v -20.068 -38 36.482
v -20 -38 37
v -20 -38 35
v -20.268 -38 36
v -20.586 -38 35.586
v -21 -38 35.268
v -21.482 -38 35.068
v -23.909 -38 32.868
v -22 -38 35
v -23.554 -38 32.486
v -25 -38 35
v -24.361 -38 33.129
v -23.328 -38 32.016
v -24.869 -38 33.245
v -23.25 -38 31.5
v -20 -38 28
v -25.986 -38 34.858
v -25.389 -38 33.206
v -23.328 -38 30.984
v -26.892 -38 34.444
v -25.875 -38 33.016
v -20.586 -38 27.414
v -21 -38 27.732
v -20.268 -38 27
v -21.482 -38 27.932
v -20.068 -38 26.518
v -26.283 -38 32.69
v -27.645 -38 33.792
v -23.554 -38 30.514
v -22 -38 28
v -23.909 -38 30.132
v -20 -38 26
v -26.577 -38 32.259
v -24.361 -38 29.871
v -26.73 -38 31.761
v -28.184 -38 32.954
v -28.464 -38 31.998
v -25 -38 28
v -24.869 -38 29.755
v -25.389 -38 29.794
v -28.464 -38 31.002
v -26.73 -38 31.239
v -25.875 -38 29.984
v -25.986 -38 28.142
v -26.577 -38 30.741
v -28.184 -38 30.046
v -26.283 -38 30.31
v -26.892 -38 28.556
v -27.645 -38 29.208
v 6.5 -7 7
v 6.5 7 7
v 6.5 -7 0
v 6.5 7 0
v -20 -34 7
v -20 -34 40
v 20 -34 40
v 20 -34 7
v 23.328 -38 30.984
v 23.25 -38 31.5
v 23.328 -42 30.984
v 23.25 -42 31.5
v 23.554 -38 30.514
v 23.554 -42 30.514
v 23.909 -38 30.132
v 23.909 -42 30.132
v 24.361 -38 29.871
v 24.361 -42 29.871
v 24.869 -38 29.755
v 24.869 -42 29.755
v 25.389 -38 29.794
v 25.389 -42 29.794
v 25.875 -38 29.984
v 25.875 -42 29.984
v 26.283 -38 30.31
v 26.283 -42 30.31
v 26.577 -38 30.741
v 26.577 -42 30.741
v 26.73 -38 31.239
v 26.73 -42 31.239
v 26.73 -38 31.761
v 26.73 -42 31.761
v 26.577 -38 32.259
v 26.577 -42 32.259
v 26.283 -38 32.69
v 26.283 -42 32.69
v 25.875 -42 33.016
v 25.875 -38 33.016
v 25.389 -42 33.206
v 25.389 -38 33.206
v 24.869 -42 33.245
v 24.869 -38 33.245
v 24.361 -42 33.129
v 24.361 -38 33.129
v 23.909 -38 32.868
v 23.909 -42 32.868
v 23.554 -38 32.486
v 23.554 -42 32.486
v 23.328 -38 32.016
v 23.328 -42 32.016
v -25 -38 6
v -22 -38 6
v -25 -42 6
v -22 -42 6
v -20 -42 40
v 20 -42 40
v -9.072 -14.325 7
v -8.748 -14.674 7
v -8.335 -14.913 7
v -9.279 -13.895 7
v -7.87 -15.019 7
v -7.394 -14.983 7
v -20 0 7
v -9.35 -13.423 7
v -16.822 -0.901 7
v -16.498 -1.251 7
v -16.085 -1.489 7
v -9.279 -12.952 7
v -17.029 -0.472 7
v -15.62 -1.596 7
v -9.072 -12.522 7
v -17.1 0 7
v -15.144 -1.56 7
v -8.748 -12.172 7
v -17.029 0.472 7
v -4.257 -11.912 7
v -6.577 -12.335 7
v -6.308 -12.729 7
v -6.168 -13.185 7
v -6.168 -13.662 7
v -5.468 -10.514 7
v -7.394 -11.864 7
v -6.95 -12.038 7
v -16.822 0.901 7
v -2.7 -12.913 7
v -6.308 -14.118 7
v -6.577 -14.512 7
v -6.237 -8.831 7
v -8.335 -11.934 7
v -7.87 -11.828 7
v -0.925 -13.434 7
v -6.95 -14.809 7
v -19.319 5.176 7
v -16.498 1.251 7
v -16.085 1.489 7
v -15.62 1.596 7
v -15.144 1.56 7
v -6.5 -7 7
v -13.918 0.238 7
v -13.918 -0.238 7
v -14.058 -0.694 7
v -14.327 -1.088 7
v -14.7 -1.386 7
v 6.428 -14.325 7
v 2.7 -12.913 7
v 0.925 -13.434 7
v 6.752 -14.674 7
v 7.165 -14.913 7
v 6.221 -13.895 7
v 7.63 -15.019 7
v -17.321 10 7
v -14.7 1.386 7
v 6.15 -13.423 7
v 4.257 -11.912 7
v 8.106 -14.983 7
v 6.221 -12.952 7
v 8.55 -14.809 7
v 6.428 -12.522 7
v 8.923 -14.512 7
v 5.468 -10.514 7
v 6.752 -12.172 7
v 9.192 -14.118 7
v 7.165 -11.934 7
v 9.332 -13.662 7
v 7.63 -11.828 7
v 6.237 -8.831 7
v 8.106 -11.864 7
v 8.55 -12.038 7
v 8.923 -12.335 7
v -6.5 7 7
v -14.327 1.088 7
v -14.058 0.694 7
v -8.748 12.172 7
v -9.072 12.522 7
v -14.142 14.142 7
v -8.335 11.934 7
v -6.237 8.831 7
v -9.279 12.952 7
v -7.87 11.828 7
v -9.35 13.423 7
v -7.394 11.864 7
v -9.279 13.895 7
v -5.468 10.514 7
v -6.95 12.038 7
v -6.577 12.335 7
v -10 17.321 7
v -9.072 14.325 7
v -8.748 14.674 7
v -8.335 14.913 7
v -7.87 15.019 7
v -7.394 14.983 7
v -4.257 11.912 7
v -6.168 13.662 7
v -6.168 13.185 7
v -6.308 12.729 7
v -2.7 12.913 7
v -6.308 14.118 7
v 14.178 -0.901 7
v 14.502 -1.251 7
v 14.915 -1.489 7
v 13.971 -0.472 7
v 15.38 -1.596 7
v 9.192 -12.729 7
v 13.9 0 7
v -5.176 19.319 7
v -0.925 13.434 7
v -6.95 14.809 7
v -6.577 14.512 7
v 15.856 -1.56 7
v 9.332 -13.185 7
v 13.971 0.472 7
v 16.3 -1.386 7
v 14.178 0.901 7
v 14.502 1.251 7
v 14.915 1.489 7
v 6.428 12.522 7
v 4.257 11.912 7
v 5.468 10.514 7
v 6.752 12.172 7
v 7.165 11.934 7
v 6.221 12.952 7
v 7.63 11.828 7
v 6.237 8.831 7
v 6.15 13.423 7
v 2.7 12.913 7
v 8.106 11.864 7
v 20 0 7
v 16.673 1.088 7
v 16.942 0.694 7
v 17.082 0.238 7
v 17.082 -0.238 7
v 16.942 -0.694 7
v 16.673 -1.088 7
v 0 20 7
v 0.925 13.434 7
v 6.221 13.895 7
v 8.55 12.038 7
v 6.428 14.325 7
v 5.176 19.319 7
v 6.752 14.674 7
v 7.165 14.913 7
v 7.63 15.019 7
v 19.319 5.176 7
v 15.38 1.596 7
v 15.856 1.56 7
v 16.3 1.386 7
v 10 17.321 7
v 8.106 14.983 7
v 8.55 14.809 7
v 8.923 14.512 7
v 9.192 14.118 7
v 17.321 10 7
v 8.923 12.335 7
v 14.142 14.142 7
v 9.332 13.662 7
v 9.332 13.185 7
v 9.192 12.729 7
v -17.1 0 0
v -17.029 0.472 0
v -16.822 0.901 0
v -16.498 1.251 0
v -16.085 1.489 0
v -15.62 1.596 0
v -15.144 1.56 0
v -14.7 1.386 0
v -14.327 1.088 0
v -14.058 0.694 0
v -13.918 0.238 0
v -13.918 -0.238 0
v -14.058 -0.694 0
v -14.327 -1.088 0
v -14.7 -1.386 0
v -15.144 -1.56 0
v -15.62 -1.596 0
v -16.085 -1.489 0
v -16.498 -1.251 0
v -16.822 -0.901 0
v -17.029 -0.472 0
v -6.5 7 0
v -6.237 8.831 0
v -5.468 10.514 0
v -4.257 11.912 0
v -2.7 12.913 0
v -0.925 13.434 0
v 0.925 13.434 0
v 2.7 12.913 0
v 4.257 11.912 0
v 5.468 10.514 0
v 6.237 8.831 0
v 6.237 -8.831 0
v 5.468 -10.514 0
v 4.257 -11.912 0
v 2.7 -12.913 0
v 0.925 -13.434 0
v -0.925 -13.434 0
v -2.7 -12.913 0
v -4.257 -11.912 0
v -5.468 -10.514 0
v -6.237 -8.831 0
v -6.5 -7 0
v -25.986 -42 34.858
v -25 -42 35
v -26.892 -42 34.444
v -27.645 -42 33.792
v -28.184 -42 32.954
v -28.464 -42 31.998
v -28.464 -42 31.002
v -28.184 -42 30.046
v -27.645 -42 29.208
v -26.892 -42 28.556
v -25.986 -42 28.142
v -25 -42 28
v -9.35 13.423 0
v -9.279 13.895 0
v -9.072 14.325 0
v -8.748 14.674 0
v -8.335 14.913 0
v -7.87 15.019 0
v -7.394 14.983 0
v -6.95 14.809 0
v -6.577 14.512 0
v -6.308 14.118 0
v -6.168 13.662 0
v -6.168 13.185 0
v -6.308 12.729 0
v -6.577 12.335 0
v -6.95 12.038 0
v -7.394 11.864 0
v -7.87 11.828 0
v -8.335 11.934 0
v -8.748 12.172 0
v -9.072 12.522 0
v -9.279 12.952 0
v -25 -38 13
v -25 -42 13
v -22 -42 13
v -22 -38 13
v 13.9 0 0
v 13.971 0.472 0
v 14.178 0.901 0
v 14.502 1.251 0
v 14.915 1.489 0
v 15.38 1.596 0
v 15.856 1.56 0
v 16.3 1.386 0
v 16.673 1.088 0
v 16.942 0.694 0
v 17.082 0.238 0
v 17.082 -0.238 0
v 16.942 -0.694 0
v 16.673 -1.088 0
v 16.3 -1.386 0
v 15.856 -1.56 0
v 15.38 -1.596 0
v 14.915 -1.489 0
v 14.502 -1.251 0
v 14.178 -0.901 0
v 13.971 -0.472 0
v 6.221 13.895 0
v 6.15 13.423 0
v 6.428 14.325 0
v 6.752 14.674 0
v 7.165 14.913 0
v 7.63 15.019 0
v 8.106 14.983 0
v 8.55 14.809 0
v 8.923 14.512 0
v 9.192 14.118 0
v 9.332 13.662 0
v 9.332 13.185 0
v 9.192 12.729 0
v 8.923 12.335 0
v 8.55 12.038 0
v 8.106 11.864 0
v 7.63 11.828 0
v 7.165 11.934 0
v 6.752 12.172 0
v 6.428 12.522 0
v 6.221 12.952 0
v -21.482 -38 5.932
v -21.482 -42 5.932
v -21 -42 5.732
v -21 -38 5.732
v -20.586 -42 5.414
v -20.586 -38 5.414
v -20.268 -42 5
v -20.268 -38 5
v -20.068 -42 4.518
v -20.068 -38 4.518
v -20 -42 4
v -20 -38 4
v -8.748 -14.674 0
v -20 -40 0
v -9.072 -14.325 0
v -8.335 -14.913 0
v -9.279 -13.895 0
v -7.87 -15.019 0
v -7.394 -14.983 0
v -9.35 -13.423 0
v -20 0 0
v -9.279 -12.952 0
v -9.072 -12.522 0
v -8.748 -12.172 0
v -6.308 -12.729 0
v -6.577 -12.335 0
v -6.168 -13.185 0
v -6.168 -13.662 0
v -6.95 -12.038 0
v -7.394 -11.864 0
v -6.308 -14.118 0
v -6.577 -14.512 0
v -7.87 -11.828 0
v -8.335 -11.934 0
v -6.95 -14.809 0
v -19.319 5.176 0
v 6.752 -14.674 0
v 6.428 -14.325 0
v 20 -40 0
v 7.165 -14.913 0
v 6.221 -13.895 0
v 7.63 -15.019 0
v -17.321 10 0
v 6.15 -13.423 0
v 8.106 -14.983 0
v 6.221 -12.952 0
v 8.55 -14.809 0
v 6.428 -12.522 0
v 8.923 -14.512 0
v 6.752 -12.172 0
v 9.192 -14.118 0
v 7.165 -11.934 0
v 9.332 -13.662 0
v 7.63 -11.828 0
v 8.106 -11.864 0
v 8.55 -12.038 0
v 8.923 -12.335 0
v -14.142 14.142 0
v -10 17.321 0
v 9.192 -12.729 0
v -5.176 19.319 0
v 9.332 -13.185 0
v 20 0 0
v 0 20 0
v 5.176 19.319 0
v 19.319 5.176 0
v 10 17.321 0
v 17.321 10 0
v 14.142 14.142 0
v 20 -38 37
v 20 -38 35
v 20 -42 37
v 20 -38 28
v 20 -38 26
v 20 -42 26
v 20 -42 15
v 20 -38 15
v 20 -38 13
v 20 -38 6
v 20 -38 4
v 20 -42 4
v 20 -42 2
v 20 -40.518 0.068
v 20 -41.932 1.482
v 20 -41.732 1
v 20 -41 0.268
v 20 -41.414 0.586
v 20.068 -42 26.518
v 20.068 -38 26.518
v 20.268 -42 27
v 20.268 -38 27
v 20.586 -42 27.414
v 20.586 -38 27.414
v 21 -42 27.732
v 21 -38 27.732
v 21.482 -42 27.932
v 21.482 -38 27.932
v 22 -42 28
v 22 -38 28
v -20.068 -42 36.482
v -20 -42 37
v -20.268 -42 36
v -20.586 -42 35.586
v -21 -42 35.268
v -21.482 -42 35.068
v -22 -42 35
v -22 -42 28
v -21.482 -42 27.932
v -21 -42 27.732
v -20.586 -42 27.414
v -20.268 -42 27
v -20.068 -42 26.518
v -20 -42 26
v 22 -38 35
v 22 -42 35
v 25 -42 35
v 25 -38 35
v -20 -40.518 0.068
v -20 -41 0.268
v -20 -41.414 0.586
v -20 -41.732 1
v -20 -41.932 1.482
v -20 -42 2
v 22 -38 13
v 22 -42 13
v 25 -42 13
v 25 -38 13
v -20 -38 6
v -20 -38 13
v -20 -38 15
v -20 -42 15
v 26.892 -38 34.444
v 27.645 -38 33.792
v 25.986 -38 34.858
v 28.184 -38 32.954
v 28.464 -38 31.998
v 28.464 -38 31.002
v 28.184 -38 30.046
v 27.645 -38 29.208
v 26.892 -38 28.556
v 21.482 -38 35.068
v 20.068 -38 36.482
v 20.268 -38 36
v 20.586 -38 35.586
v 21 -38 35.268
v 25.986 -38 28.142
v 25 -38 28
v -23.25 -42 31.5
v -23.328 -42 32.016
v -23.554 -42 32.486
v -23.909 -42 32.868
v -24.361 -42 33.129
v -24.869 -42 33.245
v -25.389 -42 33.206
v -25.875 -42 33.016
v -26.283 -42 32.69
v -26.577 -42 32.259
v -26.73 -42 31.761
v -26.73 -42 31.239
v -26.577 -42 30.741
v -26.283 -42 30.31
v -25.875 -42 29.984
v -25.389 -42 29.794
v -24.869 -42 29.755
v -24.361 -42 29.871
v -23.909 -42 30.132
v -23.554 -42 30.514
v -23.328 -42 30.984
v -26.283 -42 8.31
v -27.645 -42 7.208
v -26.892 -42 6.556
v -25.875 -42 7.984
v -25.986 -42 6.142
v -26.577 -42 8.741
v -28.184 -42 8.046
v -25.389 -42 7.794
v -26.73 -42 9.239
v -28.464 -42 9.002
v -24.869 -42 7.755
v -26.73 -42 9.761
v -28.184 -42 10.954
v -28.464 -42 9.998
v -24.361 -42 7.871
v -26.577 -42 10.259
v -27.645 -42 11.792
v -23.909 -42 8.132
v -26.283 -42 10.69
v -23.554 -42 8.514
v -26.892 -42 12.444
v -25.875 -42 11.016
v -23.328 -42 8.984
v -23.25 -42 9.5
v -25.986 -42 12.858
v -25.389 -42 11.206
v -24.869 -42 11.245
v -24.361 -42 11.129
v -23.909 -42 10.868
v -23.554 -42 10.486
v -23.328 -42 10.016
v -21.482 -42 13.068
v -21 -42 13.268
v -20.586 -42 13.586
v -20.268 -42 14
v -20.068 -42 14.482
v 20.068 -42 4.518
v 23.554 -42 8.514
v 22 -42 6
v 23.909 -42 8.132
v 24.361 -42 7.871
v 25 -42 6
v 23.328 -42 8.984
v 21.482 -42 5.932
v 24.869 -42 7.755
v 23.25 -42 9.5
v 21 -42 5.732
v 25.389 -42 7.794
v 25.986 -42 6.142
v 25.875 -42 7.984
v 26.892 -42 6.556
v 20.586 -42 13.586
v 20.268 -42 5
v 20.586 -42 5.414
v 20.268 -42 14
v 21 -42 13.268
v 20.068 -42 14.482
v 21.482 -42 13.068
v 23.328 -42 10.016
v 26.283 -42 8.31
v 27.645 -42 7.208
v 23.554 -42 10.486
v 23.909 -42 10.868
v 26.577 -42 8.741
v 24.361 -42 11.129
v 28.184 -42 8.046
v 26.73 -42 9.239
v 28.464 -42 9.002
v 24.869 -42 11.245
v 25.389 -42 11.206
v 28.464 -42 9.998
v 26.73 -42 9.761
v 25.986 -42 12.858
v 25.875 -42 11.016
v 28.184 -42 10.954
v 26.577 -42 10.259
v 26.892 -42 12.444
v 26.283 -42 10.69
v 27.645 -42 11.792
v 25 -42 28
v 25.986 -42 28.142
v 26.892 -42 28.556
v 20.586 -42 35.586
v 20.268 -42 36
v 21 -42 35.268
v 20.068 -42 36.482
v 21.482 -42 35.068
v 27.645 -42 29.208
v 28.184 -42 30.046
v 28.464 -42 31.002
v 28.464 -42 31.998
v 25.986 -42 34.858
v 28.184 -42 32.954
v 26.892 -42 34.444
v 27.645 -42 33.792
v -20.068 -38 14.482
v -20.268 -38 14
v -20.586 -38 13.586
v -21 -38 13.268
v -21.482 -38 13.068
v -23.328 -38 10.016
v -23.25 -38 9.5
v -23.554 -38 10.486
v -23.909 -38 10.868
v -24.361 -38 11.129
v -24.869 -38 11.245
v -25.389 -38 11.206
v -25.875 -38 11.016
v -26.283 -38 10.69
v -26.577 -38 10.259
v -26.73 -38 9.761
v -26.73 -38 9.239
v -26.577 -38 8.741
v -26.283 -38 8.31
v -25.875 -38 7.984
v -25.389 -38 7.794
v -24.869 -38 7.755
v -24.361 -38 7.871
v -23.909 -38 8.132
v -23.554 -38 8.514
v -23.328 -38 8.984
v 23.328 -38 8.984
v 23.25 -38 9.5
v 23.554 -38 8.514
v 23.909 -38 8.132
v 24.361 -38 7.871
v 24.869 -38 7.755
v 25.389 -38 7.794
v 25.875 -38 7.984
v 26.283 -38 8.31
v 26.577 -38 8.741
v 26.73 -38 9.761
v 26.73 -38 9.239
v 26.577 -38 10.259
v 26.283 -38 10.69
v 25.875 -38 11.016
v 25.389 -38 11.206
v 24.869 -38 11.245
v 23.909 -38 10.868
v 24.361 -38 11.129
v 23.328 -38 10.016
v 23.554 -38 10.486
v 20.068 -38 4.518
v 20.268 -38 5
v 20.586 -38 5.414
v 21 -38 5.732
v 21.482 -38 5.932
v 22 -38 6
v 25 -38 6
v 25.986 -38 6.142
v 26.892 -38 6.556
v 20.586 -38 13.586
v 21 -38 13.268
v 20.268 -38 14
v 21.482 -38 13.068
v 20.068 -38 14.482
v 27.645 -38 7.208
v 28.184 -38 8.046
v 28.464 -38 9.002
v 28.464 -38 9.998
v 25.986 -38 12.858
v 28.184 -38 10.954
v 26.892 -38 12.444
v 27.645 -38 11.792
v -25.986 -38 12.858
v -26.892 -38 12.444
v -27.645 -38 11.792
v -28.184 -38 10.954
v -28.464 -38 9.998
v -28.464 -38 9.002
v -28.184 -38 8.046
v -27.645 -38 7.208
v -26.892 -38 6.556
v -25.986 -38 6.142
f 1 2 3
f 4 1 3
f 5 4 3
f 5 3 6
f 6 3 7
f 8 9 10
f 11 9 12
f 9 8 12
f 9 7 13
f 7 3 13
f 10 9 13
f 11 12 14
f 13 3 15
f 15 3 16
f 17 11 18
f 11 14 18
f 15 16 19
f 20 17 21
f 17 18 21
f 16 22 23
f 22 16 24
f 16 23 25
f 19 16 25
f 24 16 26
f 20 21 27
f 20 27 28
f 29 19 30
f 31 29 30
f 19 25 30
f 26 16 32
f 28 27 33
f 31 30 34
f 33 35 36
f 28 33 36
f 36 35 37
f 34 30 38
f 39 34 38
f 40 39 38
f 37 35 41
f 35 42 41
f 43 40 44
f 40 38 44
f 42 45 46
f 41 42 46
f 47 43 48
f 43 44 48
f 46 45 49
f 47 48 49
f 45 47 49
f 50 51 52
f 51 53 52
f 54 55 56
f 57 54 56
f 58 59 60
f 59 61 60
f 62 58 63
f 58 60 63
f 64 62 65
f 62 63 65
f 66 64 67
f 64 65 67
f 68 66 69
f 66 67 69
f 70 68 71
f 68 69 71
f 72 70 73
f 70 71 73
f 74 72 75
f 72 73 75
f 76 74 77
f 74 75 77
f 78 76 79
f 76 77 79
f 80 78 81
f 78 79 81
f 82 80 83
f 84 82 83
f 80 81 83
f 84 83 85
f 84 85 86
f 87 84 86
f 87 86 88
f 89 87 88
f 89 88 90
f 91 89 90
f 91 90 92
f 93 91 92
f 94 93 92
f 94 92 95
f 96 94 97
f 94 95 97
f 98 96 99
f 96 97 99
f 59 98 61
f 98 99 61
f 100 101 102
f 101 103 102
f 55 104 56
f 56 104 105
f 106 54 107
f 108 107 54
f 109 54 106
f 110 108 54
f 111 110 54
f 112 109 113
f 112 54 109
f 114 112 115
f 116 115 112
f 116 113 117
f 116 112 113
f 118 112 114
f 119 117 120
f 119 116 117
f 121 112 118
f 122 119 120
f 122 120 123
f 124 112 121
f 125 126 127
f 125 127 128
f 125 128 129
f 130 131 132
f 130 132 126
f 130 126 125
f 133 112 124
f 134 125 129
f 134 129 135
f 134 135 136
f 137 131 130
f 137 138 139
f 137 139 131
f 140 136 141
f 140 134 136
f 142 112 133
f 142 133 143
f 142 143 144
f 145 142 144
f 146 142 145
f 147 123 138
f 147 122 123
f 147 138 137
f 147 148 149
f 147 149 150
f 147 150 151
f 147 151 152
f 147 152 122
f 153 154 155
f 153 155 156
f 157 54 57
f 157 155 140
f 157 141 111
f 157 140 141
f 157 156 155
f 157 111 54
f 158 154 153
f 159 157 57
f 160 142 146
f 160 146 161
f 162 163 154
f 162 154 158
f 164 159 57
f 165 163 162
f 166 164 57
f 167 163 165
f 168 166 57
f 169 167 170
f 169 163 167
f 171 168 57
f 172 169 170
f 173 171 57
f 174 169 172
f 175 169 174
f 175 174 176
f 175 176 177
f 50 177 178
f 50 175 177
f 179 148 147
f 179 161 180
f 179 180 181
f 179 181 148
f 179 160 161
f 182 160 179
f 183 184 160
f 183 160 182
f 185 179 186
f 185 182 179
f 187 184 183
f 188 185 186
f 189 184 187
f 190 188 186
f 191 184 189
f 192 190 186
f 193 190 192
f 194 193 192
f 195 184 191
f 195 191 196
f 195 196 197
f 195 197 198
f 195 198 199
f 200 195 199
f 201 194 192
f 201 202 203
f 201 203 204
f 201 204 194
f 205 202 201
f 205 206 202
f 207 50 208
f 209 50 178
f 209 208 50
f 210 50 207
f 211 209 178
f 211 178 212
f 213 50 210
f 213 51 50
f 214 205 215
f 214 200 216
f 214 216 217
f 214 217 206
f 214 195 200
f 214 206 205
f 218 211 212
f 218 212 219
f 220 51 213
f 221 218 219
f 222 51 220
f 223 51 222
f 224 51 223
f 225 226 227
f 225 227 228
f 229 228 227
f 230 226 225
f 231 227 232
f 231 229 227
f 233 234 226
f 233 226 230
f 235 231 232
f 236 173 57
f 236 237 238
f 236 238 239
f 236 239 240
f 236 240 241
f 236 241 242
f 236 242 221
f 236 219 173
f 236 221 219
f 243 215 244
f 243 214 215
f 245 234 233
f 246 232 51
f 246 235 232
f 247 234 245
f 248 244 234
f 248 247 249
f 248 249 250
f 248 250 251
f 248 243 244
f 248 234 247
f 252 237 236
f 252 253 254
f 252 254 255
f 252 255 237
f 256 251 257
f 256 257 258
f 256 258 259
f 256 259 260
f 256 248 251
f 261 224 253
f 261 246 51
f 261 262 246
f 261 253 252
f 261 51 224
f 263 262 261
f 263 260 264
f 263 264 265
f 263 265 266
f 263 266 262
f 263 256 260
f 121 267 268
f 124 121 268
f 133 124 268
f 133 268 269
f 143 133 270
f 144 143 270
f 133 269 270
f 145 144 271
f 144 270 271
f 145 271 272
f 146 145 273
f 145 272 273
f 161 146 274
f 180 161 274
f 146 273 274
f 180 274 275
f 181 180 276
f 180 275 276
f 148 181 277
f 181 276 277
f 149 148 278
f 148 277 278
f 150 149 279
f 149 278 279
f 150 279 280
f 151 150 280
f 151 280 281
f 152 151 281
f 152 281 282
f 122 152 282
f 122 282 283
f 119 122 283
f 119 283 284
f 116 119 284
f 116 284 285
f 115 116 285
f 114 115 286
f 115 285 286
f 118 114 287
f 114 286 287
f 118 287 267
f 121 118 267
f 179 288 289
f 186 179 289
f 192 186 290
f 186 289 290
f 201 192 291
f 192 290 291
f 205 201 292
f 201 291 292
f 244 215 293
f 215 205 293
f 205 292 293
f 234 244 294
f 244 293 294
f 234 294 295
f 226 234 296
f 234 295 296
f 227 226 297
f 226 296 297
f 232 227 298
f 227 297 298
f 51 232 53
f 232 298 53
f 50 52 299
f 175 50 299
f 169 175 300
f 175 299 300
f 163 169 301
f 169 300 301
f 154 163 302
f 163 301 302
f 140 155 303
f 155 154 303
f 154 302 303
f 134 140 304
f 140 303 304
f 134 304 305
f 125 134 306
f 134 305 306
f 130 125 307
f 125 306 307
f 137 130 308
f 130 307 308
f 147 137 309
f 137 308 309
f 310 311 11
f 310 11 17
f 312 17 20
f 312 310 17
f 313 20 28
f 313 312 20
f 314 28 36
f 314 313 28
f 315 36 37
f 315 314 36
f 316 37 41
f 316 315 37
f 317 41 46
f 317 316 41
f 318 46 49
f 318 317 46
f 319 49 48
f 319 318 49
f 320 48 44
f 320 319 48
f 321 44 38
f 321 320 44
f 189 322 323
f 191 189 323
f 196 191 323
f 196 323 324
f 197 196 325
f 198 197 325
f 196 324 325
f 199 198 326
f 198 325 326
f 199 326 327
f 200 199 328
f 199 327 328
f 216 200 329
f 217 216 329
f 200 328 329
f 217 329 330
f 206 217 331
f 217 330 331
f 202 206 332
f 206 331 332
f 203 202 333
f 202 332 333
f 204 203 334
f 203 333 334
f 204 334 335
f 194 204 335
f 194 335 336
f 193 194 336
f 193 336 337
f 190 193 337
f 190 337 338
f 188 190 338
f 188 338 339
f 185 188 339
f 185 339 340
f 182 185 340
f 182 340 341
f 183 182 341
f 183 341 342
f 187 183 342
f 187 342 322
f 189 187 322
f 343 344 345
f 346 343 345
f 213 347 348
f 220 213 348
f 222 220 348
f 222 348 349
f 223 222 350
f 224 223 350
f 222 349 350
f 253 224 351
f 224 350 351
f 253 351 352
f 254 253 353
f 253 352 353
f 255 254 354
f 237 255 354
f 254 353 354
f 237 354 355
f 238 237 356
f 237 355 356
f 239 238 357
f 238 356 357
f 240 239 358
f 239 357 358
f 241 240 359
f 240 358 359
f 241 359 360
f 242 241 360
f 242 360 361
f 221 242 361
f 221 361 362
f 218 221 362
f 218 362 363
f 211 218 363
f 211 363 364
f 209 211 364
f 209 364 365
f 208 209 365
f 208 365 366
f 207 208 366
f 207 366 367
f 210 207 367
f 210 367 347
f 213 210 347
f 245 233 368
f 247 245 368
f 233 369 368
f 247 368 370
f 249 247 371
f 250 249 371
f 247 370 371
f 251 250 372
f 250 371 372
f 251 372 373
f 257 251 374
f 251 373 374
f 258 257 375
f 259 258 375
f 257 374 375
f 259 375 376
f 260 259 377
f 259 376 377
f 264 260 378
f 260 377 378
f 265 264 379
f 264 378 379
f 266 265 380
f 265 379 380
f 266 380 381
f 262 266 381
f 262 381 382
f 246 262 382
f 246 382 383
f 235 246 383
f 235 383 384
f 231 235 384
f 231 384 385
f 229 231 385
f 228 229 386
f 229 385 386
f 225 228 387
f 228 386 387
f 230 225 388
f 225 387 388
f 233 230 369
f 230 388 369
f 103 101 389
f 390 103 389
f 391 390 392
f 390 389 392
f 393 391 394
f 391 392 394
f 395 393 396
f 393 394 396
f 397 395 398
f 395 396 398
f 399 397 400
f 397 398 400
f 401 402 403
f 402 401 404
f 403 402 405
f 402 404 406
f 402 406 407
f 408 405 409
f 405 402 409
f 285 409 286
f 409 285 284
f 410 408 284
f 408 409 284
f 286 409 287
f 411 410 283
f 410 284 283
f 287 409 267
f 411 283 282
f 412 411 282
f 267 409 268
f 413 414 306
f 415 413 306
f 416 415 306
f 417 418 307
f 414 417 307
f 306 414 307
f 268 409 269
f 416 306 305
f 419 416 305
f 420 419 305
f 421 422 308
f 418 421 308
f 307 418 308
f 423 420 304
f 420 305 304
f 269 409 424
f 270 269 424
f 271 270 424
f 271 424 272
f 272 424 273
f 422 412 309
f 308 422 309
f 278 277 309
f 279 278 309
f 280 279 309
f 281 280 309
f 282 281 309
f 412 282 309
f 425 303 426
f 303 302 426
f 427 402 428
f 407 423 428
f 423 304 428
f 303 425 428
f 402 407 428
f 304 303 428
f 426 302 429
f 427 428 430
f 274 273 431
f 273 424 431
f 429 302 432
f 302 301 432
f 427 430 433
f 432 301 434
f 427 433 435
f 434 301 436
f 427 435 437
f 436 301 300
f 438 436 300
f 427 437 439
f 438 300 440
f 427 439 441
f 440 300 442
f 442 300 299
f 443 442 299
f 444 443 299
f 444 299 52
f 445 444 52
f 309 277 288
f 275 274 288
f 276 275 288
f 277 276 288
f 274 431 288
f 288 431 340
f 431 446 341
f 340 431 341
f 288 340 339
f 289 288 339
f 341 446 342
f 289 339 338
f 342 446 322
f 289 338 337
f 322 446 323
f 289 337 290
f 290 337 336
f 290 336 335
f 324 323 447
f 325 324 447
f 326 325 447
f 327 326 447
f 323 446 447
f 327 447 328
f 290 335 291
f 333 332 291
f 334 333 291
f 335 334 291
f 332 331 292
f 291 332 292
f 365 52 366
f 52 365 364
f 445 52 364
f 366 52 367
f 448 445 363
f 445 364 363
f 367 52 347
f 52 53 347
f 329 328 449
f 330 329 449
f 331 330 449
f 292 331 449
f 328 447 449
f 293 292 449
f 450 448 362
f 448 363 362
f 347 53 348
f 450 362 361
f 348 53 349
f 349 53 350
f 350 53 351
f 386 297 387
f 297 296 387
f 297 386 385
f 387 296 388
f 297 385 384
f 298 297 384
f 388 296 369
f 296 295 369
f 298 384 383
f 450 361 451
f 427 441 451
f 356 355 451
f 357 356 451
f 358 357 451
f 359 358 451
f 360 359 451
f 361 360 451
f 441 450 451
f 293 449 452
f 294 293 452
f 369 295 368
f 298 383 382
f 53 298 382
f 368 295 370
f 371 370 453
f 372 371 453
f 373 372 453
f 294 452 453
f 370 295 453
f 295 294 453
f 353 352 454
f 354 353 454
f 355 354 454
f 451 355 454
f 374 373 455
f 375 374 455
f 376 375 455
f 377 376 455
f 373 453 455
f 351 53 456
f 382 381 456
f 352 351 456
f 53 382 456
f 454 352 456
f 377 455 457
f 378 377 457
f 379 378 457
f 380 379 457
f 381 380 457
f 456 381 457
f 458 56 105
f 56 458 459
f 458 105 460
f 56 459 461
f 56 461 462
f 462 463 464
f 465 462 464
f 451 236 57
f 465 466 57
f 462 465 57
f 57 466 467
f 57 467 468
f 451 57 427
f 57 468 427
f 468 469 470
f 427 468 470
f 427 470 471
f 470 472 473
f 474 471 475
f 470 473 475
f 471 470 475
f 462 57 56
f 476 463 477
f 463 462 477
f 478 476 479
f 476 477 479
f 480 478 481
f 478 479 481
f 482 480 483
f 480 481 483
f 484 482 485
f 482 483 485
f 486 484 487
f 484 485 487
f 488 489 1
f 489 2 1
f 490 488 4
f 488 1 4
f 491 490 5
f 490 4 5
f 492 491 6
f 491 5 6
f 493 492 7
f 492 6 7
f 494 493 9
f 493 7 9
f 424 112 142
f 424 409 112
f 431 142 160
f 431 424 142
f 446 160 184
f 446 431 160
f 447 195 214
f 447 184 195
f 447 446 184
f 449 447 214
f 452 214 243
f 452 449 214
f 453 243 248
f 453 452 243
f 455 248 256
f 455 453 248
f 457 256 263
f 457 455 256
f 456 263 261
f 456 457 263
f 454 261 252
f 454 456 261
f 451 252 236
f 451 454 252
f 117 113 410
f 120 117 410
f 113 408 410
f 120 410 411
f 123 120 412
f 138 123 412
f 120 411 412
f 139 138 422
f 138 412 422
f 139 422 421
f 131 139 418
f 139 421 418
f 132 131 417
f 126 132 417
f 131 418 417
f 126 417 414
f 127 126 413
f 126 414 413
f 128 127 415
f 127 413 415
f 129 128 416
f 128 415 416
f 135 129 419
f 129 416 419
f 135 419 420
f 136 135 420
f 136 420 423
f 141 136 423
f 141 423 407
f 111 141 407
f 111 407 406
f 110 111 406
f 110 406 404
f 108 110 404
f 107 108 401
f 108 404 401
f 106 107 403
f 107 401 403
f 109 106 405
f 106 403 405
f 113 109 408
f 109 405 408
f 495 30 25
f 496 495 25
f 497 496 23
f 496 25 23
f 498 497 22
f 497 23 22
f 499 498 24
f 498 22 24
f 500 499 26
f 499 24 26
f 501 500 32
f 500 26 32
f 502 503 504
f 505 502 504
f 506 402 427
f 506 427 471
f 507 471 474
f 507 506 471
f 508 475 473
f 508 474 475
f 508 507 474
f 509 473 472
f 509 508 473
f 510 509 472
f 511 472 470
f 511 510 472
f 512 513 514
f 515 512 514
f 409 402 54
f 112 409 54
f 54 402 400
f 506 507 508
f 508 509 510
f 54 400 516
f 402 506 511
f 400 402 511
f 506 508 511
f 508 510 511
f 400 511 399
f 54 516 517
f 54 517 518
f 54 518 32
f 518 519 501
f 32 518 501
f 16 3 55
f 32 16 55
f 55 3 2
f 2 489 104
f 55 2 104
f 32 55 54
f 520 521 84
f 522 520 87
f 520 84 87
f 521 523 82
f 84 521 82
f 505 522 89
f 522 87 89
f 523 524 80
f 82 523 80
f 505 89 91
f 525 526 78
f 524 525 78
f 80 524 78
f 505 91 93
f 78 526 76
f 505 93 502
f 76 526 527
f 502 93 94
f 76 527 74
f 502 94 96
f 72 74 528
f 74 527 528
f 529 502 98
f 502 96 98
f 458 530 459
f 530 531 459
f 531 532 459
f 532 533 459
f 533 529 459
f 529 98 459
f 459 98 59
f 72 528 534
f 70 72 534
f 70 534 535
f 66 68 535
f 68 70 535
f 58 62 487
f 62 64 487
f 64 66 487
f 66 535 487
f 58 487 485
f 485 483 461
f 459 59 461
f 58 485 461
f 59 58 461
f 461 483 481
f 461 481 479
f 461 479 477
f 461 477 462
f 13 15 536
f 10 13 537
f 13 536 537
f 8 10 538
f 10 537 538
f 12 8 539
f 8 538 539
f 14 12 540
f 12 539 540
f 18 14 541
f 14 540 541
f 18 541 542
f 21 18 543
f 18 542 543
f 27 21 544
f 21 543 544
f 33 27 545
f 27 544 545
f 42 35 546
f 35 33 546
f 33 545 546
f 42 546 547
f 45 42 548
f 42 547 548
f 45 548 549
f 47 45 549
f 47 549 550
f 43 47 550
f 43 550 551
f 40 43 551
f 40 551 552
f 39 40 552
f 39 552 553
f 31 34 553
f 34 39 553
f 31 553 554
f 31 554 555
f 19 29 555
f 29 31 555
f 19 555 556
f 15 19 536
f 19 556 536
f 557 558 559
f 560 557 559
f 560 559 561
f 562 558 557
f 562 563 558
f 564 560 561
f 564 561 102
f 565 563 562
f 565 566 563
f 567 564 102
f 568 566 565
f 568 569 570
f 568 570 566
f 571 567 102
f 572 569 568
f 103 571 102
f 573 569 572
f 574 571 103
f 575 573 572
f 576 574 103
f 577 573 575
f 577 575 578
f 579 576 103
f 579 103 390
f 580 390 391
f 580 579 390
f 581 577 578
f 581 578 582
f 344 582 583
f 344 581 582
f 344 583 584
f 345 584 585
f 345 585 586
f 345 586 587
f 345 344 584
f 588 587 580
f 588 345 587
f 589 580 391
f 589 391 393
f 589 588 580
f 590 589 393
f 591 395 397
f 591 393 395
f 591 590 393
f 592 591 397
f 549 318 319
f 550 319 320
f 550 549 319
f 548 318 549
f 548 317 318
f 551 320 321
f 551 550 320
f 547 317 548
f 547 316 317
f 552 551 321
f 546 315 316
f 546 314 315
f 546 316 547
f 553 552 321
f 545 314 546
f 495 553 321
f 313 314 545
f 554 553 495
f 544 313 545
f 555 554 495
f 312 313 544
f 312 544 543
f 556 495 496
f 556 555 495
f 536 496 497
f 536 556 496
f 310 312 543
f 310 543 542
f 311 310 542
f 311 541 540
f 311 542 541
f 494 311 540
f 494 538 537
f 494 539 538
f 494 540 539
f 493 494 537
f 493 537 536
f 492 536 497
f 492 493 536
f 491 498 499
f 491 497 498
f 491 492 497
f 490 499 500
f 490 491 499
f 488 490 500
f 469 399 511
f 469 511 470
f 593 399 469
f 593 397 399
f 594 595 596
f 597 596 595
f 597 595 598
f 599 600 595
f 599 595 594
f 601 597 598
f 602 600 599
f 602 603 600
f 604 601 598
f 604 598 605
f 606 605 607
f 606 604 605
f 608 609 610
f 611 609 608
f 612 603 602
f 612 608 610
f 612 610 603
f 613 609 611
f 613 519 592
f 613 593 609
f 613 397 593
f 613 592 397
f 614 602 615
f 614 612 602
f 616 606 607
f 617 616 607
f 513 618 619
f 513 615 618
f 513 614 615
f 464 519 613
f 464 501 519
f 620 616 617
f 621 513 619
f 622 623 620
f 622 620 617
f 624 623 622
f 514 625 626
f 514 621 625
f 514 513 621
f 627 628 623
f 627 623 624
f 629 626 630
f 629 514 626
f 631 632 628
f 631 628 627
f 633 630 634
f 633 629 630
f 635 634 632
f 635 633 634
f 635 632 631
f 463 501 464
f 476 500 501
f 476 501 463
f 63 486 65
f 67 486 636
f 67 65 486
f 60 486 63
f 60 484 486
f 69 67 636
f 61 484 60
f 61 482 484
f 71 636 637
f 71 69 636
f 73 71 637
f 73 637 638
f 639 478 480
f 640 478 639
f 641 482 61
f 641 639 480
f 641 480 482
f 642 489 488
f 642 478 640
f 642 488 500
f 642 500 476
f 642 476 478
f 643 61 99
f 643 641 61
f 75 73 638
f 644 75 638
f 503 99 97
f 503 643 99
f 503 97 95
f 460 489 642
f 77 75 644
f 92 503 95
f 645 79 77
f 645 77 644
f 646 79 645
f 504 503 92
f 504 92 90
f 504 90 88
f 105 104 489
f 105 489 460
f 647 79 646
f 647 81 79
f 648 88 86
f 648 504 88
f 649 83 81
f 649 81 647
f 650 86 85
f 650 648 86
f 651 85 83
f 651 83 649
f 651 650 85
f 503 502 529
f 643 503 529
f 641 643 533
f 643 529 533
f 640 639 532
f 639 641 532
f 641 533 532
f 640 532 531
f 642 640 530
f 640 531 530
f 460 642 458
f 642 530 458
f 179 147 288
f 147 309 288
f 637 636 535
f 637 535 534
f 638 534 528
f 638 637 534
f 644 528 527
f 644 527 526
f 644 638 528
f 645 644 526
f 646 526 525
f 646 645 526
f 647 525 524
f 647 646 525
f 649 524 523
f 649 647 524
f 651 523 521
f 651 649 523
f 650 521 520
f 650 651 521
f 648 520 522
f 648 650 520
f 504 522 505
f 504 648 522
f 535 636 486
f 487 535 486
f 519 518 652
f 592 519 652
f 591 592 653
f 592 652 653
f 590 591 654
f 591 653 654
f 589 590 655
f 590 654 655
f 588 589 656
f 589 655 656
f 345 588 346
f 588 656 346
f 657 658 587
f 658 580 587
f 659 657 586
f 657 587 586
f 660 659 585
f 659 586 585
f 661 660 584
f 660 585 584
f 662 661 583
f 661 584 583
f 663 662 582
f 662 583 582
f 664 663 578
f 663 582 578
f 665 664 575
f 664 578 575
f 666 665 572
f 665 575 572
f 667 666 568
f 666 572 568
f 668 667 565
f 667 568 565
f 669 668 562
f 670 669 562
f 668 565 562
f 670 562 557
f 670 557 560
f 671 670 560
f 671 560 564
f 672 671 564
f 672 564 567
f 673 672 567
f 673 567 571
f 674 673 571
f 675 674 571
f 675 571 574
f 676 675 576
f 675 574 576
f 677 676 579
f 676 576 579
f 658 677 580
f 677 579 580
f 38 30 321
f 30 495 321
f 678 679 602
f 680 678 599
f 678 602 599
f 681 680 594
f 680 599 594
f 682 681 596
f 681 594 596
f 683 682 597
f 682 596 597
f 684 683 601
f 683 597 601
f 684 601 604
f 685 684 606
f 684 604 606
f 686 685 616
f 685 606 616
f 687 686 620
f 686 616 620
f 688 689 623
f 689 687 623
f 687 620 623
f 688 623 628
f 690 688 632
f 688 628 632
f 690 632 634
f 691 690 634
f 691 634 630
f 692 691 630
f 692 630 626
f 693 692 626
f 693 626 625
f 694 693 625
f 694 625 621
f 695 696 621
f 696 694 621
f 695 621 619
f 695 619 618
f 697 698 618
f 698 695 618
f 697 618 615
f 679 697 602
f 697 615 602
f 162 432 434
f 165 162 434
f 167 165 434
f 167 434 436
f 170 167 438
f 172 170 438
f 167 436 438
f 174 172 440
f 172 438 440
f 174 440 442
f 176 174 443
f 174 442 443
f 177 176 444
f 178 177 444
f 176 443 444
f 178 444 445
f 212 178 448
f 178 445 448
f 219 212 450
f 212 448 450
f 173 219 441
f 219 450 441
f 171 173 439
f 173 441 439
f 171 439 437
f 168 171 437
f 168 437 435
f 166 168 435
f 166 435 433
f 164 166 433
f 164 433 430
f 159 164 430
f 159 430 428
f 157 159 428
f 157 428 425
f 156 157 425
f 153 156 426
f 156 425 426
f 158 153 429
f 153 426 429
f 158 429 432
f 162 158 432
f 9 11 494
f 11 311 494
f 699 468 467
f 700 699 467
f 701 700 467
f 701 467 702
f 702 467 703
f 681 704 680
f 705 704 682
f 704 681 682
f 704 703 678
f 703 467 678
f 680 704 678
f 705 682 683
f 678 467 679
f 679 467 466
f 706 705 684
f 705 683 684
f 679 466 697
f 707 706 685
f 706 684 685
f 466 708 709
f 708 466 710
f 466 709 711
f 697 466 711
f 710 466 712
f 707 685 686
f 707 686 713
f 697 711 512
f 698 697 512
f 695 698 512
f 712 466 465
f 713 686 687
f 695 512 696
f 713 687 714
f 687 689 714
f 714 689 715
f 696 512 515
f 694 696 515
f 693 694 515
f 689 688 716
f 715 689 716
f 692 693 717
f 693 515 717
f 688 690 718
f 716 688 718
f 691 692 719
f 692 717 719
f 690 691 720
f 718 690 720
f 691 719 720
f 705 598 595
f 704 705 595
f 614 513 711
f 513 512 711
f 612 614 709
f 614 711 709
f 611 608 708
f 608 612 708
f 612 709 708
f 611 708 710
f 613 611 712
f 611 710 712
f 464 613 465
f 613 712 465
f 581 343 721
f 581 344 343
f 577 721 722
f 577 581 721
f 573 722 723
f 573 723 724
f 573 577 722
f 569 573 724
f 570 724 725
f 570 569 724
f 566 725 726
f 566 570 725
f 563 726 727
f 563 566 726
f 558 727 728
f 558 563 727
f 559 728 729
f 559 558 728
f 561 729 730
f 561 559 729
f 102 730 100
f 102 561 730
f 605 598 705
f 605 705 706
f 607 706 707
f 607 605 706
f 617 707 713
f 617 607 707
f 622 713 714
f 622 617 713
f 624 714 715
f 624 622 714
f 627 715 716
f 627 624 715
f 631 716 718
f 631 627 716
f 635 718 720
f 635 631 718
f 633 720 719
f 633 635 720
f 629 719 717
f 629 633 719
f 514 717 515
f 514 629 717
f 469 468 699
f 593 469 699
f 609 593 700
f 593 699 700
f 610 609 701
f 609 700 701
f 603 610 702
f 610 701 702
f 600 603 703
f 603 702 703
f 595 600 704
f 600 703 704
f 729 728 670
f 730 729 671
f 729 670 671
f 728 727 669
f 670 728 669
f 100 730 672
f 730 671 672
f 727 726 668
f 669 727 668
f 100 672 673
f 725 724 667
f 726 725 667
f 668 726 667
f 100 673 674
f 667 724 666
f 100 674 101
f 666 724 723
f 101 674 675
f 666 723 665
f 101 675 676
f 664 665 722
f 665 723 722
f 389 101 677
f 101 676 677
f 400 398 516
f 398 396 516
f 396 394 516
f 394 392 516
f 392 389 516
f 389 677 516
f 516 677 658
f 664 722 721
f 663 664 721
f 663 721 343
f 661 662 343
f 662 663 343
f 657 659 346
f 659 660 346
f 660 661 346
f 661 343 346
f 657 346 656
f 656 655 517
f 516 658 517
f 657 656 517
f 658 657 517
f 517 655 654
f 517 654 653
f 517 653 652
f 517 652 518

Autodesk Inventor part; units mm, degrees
ref_plane "YZ Plane" through (0, 0, 0) normal (1, 0, 0) x (0, 1, 0)
ref_plane "XZ Plane" through (0, 0, 0) normal (0, 1, 0) x (-1, 0, 0)
sketch "Sketch1" plane through (0, 0, 0) normal (0, 0, 1) x (1, 0, 0)
  circle A0 centre (0, 0) radius 20
  circle A1 centre (0, 15.55) radius 1.6
  line L0 (-20, 0) -> (20, 0) construction
  line L1 (20, 0) -> (20, -42)
  line L2 (20, -42) -> (-20, -42)
  line L3 (-20, -42) -> (-20, 0)
  circle A2 centre (-13.4667, 7.775) radius 1.6
  circle A3 centre (-13.4667, -7.775) radius 1.6
  circle A4 centre (0, -15.55) radius 1.6
  circle A5 centre (13.4667, -7.775) radius 1.6
  circle A6 centre (13.4667, 7.775) radius 1.6
  line L4 (0, -7) -> (0, 7) construction
  line L5 (-6.5, -7) -> (-6.5, 7)
  line L6 (6.5, 7) -> (6.5, -7)
  arc A7 (-6.5, -7) -> (6.5, -7) centre (0, -7) ccw
  arc A8 (6.5, 7) -> (-6.5, 7) centre (0, 7) ccw
  dimension "d0" = 40
  dimension "d1" = 15.55
  dimension "d3" = 42
  dimension "d6" = 360
  dimension "d8" = 6.5
  dimension "d9" = 14
extrude "Extrusion1" add sketch "Sketch1" along normal blind 7 contours A0 | L1 L2 L3 A0 | A1 | A2 | A3 | A4 | A5 | A6
sketch "Sketch2" plane through (0, 0, 0) normal (0, 0, -1) x (-1, 0, 0)
  line L0 (20, 0) -> (20, -42) projected
  arc A0 (20, 0) -> (-20, 0) centre (0, 0) ccw projected
  line L1 (-20, -42) -> (-20, 0) projected
  line L2 (20, -42) -> (-20, -42) projected
  line L3 (-6.5, 7) -> (-6.5, -7) projected
  arc A1 (6.5, 7) -> (-6.5, 7) centre (0, 7) ccw projected
  line L4 (6.5, -7) -> (6.5, 7) projected
  arc A2 (-6.5, -7) -> (6.5, -7) centre (0, -7) ccw projected
  circle A3 centre (0, 0) radius 15.5 construction
  circle A4 centre (-7.75, 13.4234) radius 1.6
  line L5 (0, 0) -> (-7.75, 13.4234) construction
  line L6 (0, 0) -> (0, 15.5) construction
  circle A5 centre (-15.5, 0) radius 1.6
  circle A6 centre (-7.75, -13.4234) radius 1.6
  circle A7 centre (7.75, -13.4234) radius 1.6
  circle A8 centre (15.5, 0) radius 1.6
  circle A9 centre (7.75, 13.4234) radius 1.6
  dimension "d12" = 31
  dimension "d13" = 3.2
  dimension "d14" = 30
  dimension "d17" = 360
extrude "Extrusion2" cut sketch "Sketch2" against normal through all contours A4 | A5 | A6 | A7 | A8 | A9
sketch "Sketch3" plane through (-20, -42, 0) normal (0, -1, 0) x (1, 0, 0)
  line L0 (0, 0) -> (40, 0) projected
  line L1 (40, 0) -> (40, 7) projected
  line L2 (0, 7) -> (40, 7) projected
  line L3 (0, 0) -> (0, 7) projected
  line L4 (40, 0) -> (40, 7) projected
  line L5 (40, 7) -> (0, 7)
  line L6 (0, 7) -> (0, 40)
  line L7 (0, 40) -> (40, 40)
  line L8 (40, 40) -> (40, 7)
  point P0 (20, 0)
  dimension "d21" = 40
extrude "Extrusion3" add sketch "Sketch3" against normal blind 8 contours L6 L7 L8 L2
fillet "Fillet1" radius 2 1 edges at (0, -42, 0)
sketch "Sketch4" plane through (-20, -42, 2) normal (0, -1, 0) x (1, 0, 0)
  line L0 (40, 38) -> (0, 38) projected
  line L1 (0, 0) -> (0, 38) projected
  line L2 (40, 0) -> (0, 0) projected
  line L3 (40, 0) -> (40, 38) projected
  line L4 (5, 4) -> (-5, 4)
  line L5 (-5, 4) -> (-5, 11)
  line L6 (-5, 11) -> (5, 11)
  line L7 (5, 11) -> (5, 4)
  line L8 (5, 4) -> (-5, 11) construction
  line L9 (-5, 4) -> (5, 11) construction
  circle A0 centre (-5, 7.5) radius 3.5
  circle A1 centre (-5, 7.5) radius 1.75
  point P0 (20, -2)
  point P1 (0, 7.5)
  point P2 (0, 4)
  point P3 (0, 11)
  point P4 (-5, 11)
  dimension "d26" = 7
  dimension "d27" = 5
  dimension "d28" = 4
  dimension "d29" = 3.5
extrude "Extrusion4" add sketch "Sketch4" against normal blind 4 contours L1 L4 A0 L6 | A0 L5 A1 | L5 A1 A0
ref_plane "Work Plane1" through (0, 0, 22.5) normal (0, 0, 1) x (1, 0, 0)
ref_plane "Work Plane2" through (0, 0, 20.5) normal (0, 0, 1) x (1, 0, 0)
mirror "Mirror2" about plane through (0, 0, 0) normal (1, 0, 0) of "Extrusion4"
mirror "Mirror3" about plane through (0, 0, 20.5) normal (0, 0, 1) of "Extrusion4", "Mirror2"
fillet "Fillet4" radius 2 8 edges at (20, -40, 6) (20, -40, 28) (-20, -40, 6) (-20, -40, 13) (-20, -40, 28) (-20, -40, 35) (20, -40, 35) (20, -40, 13)
properties part number "08_Ga_dong_co_02" material "Polyethylene, High Density"
